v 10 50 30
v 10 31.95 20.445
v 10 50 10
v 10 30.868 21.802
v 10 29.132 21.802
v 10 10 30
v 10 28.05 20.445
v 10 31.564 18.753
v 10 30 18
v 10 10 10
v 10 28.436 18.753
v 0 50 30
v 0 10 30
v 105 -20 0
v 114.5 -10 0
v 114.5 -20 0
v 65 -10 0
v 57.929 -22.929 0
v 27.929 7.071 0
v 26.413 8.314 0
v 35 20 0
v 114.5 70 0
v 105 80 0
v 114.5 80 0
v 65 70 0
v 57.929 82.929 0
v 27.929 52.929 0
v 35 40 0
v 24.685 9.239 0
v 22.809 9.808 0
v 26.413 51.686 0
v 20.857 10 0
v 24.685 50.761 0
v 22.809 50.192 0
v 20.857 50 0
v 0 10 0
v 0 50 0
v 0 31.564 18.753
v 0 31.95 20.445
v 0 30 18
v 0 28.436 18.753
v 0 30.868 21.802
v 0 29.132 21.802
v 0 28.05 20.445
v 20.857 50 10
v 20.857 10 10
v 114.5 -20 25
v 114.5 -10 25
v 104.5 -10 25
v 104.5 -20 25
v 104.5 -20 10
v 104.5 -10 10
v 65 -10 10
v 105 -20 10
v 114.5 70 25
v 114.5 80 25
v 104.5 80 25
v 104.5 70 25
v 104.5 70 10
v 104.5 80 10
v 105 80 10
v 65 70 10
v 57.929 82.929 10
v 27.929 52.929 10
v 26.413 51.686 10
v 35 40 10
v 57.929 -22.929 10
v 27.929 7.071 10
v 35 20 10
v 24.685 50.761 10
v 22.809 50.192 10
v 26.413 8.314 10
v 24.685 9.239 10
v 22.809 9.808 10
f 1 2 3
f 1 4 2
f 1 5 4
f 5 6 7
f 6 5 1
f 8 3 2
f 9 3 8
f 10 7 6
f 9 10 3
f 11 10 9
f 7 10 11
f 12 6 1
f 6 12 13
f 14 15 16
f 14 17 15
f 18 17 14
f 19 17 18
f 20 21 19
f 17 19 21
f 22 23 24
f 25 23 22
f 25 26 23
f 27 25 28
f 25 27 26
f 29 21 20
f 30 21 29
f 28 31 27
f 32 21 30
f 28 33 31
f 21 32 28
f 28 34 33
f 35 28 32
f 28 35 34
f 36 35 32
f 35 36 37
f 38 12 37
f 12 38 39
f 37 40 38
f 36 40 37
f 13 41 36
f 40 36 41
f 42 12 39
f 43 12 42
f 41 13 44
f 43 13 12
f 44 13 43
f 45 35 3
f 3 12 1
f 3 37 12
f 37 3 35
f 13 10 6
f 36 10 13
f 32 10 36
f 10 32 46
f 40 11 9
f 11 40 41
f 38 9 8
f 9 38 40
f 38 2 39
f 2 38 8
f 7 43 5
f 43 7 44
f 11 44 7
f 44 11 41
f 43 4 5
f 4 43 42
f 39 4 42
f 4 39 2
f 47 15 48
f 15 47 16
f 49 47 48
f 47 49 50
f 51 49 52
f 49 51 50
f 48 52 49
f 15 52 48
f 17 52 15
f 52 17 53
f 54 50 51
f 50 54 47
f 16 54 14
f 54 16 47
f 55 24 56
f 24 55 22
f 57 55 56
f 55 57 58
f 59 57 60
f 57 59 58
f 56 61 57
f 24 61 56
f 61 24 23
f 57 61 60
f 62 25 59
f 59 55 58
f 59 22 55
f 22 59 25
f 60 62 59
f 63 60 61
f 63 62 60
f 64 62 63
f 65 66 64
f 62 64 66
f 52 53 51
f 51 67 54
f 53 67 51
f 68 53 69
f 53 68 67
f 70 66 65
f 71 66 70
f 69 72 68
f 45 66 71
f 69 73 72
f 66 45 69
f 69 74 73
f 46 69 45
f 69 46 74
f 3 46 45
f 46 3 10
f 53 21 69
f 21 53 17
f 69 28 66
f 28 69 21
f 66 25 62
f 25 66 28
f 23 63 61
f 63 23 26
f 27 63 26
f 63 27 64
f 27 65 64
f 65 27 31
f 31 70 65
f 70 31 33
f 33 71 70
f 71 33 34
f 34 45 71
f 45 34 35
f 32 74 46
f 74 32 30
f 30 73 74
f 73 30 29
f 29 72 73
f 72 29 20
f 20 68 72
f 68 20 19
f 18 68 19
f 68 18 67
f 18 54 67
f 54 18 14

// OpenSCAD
module wallHook() {
    translate([0,10,0]) {
        difference(){
            cube([10,40,30]);
            translate([-5, 20, 20]) {
                rotate([0,90,0]) {
                    cylinder(h=20,r=2);
                }
            }
        }

    }
    translate([5,-10,0]) {
        dxfHook();
    }
    for (i=[-20,70]) {
        translate([104.5, i, 0]) {
            cube(size=[10,10, 25], center=false);
        }
    }


}

module dxfHook() {
    linear_extrude(height=10,center = false, convexity = 10) {
       import (file = "prop_wall_hook.dxf");
    }
}





wallHook();
